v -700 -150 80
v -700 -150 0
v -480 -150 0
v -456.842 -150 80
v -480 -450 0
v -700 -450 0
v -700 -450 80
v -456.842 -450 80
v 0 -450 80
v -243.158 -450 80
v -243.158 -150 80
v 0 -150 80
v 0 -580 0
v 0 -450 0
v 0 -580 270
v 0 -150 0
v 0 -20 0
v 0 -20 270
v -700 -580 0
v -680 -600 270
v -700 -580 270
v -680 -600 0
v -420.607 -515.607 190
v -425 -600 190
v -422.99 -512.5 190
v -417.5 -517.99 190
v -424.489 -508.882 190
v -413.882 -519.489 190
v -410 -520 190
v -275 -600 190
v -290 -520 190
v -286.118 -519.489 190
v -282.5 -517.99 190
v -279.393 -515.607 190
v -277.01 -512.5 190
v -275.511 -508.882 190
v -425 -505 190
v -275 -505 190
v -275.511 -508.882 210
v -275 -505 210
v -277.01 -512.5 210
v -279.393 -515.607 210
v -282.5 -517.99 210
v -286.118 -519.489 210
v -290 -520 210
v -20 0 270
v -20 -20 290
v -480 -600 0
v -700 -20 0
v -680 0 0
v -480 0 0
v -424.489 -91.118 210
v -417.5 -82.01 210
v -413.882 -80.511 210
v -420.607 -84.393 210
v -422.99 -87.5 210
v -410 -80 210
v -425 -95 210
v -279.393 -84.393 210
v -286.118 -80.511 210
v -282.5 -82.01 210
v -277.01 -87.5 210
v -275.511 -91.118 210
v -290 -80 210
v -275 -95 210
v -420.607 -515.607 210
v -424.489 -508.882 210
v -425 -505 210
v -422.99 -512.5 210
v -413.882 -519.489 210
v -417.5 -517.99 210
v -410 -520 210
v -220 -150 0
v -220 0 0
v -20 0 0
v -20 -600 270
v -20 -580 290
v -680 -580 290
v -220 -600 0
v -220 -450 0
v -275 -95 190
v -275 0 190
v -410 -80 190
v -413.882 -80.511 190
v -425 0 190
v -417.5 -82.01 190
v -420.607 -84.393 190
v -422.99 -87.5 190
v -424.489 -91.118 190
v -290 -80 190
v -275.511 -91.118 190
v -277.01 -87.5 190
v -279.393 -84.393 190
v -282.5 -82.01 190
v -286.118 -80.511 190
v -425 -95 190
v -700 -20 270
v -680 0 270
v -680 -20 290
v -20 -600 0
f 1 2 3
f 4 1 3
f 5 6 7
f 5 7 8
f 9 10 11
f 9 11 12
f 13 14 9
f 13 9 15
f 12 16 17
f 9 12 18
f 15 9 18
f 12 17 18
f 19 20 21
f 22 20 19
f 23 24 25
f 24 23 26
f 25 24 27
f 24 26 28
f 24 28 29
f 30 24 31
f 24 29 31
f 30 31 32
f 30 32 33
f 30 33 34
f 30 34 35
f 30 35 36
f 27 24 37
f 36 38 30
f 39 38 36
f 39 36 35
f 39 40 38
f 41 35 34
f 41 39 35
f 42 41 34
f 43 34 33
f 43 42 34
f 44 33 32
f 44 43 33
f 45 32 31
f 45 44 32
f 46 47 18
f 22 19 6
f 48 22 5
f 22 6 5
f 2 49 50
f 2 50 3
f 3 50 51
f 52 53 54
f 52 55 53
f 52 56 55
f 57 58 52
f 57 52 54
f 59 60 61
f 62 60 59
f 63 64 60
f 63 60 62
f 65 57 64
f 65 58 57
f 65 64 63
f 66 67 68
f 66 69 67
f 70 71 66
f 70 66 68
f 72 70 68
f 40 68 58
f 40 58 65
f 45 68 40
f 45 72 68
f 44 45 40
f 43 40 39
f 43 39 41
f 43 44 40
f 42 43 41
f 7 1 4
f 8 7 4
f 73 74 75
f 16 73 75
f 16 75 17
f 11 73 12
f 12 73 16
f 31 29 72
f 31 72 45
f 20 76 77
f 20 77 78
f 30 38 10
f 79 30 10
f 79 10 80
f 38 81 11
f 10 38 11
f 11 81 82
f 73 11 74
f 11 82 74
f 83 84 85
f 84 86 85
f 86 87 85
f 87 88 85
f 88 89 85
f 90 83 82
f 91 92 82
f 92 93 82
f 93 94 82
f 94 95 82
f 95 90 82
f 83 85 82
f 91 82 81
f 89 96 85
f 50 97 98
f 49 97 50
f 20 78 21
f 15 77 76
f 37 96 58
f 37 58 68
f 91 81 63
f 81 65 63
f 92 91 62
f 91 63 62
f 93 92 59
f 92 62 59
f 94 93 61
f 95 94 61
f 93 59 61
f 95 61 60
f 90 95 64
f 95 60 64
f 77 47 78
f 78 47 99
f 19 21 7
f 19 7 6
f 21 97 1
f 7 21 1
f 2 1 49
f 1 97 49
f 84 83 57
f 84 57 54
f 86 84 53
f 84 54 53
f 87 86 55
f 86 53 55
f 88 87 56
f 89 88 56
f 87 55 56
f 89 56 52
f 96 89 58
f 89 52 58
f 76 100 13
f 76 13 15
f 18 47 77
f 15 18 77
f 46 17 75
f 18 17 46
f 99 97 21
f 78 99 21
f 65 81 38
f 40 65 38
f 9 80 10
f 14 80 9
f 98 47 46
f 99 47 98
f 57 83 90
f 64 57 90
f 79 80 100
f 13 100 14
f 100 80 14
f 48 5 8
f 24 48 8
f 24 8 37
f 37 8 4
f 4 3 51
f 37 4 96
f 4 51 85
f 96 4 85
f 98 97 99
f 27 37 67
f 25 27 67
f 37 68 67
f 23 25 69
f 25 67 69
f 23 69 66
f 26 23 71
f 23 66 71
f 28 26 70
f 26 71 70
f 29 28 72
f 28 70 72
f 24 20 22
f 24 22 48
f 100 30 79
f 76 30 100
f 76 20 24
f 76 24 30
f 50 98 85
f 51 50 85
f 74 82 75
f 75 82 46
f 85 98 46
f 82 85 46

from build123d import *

# Parameters (mm, degrees)
F1_DEPTH = 600
F2_W     = 760
F2_H     = 300
F3_DEPTH = 80
F4_W     = 150
F4_H     = 440
F5_DEPTH = 20
F6_SIZE  = 20
F7_R     = 15


with BuildPart() as f1:
    # F0 (on Front) → F1 (new body)
    with BuildSketch(Plane.XZ):
        Polygon((-220, 0), (0, 0), (0, 290), (-700, 290), (-700, 0), (-480, 0), (-425, 190), (-275, 190), align=None)
    extrude(amount=F1_DEPTH)

    # F2 (on face) → F3 (cut)
    with BuildSketch(Plane(origin=(0, 0, 0), x_dir=(1, 0, 0), z_dir=(0, 0, -1))):
        with Locations((-350, 300)):
            Rectangle(F2_W, F2_H)
    extrude(amount=-F3_DEPTH, mode=Mode.SUBTRACT)

    # F4 (on face) → F5 (cut)
    with BuildSketch(Plane(origin=(0, 0, 190), x_dir=(1, 0, 0), z_dir=(0, 0, -1))):
        with Locations((-350, 300)):
            Rectangle(F4_W, F4_H)
    extrude(amount=-F5_DEPTH, mode=Mode.SUBTRACT)

    # F6
    f6_edges = [f1.edges().sort_by_distance(p)[0] for p in [
        (-700, 0, 145),
        (-700, -300, 290),
        (-350, 0, 290),
        (0, -300, 290),
        (-350, -600, 290),
        (-700, -600, 145),
        (0, -600, 145),
        (0, 0, 145),
    ]]
    chamfer(f6_edges, length=F6_SIZE)

    # F7
    f7_edges = [f1.edges().sort_by_distance(p)[0] for p in [
        (-425, -520, 200),
        (-275, -520, 200),
        (-425, -80, 200),
        (-275, -80, 200),
    ]]
    fillet(f7_edges, radius=F7_R)


solid = f1.part
